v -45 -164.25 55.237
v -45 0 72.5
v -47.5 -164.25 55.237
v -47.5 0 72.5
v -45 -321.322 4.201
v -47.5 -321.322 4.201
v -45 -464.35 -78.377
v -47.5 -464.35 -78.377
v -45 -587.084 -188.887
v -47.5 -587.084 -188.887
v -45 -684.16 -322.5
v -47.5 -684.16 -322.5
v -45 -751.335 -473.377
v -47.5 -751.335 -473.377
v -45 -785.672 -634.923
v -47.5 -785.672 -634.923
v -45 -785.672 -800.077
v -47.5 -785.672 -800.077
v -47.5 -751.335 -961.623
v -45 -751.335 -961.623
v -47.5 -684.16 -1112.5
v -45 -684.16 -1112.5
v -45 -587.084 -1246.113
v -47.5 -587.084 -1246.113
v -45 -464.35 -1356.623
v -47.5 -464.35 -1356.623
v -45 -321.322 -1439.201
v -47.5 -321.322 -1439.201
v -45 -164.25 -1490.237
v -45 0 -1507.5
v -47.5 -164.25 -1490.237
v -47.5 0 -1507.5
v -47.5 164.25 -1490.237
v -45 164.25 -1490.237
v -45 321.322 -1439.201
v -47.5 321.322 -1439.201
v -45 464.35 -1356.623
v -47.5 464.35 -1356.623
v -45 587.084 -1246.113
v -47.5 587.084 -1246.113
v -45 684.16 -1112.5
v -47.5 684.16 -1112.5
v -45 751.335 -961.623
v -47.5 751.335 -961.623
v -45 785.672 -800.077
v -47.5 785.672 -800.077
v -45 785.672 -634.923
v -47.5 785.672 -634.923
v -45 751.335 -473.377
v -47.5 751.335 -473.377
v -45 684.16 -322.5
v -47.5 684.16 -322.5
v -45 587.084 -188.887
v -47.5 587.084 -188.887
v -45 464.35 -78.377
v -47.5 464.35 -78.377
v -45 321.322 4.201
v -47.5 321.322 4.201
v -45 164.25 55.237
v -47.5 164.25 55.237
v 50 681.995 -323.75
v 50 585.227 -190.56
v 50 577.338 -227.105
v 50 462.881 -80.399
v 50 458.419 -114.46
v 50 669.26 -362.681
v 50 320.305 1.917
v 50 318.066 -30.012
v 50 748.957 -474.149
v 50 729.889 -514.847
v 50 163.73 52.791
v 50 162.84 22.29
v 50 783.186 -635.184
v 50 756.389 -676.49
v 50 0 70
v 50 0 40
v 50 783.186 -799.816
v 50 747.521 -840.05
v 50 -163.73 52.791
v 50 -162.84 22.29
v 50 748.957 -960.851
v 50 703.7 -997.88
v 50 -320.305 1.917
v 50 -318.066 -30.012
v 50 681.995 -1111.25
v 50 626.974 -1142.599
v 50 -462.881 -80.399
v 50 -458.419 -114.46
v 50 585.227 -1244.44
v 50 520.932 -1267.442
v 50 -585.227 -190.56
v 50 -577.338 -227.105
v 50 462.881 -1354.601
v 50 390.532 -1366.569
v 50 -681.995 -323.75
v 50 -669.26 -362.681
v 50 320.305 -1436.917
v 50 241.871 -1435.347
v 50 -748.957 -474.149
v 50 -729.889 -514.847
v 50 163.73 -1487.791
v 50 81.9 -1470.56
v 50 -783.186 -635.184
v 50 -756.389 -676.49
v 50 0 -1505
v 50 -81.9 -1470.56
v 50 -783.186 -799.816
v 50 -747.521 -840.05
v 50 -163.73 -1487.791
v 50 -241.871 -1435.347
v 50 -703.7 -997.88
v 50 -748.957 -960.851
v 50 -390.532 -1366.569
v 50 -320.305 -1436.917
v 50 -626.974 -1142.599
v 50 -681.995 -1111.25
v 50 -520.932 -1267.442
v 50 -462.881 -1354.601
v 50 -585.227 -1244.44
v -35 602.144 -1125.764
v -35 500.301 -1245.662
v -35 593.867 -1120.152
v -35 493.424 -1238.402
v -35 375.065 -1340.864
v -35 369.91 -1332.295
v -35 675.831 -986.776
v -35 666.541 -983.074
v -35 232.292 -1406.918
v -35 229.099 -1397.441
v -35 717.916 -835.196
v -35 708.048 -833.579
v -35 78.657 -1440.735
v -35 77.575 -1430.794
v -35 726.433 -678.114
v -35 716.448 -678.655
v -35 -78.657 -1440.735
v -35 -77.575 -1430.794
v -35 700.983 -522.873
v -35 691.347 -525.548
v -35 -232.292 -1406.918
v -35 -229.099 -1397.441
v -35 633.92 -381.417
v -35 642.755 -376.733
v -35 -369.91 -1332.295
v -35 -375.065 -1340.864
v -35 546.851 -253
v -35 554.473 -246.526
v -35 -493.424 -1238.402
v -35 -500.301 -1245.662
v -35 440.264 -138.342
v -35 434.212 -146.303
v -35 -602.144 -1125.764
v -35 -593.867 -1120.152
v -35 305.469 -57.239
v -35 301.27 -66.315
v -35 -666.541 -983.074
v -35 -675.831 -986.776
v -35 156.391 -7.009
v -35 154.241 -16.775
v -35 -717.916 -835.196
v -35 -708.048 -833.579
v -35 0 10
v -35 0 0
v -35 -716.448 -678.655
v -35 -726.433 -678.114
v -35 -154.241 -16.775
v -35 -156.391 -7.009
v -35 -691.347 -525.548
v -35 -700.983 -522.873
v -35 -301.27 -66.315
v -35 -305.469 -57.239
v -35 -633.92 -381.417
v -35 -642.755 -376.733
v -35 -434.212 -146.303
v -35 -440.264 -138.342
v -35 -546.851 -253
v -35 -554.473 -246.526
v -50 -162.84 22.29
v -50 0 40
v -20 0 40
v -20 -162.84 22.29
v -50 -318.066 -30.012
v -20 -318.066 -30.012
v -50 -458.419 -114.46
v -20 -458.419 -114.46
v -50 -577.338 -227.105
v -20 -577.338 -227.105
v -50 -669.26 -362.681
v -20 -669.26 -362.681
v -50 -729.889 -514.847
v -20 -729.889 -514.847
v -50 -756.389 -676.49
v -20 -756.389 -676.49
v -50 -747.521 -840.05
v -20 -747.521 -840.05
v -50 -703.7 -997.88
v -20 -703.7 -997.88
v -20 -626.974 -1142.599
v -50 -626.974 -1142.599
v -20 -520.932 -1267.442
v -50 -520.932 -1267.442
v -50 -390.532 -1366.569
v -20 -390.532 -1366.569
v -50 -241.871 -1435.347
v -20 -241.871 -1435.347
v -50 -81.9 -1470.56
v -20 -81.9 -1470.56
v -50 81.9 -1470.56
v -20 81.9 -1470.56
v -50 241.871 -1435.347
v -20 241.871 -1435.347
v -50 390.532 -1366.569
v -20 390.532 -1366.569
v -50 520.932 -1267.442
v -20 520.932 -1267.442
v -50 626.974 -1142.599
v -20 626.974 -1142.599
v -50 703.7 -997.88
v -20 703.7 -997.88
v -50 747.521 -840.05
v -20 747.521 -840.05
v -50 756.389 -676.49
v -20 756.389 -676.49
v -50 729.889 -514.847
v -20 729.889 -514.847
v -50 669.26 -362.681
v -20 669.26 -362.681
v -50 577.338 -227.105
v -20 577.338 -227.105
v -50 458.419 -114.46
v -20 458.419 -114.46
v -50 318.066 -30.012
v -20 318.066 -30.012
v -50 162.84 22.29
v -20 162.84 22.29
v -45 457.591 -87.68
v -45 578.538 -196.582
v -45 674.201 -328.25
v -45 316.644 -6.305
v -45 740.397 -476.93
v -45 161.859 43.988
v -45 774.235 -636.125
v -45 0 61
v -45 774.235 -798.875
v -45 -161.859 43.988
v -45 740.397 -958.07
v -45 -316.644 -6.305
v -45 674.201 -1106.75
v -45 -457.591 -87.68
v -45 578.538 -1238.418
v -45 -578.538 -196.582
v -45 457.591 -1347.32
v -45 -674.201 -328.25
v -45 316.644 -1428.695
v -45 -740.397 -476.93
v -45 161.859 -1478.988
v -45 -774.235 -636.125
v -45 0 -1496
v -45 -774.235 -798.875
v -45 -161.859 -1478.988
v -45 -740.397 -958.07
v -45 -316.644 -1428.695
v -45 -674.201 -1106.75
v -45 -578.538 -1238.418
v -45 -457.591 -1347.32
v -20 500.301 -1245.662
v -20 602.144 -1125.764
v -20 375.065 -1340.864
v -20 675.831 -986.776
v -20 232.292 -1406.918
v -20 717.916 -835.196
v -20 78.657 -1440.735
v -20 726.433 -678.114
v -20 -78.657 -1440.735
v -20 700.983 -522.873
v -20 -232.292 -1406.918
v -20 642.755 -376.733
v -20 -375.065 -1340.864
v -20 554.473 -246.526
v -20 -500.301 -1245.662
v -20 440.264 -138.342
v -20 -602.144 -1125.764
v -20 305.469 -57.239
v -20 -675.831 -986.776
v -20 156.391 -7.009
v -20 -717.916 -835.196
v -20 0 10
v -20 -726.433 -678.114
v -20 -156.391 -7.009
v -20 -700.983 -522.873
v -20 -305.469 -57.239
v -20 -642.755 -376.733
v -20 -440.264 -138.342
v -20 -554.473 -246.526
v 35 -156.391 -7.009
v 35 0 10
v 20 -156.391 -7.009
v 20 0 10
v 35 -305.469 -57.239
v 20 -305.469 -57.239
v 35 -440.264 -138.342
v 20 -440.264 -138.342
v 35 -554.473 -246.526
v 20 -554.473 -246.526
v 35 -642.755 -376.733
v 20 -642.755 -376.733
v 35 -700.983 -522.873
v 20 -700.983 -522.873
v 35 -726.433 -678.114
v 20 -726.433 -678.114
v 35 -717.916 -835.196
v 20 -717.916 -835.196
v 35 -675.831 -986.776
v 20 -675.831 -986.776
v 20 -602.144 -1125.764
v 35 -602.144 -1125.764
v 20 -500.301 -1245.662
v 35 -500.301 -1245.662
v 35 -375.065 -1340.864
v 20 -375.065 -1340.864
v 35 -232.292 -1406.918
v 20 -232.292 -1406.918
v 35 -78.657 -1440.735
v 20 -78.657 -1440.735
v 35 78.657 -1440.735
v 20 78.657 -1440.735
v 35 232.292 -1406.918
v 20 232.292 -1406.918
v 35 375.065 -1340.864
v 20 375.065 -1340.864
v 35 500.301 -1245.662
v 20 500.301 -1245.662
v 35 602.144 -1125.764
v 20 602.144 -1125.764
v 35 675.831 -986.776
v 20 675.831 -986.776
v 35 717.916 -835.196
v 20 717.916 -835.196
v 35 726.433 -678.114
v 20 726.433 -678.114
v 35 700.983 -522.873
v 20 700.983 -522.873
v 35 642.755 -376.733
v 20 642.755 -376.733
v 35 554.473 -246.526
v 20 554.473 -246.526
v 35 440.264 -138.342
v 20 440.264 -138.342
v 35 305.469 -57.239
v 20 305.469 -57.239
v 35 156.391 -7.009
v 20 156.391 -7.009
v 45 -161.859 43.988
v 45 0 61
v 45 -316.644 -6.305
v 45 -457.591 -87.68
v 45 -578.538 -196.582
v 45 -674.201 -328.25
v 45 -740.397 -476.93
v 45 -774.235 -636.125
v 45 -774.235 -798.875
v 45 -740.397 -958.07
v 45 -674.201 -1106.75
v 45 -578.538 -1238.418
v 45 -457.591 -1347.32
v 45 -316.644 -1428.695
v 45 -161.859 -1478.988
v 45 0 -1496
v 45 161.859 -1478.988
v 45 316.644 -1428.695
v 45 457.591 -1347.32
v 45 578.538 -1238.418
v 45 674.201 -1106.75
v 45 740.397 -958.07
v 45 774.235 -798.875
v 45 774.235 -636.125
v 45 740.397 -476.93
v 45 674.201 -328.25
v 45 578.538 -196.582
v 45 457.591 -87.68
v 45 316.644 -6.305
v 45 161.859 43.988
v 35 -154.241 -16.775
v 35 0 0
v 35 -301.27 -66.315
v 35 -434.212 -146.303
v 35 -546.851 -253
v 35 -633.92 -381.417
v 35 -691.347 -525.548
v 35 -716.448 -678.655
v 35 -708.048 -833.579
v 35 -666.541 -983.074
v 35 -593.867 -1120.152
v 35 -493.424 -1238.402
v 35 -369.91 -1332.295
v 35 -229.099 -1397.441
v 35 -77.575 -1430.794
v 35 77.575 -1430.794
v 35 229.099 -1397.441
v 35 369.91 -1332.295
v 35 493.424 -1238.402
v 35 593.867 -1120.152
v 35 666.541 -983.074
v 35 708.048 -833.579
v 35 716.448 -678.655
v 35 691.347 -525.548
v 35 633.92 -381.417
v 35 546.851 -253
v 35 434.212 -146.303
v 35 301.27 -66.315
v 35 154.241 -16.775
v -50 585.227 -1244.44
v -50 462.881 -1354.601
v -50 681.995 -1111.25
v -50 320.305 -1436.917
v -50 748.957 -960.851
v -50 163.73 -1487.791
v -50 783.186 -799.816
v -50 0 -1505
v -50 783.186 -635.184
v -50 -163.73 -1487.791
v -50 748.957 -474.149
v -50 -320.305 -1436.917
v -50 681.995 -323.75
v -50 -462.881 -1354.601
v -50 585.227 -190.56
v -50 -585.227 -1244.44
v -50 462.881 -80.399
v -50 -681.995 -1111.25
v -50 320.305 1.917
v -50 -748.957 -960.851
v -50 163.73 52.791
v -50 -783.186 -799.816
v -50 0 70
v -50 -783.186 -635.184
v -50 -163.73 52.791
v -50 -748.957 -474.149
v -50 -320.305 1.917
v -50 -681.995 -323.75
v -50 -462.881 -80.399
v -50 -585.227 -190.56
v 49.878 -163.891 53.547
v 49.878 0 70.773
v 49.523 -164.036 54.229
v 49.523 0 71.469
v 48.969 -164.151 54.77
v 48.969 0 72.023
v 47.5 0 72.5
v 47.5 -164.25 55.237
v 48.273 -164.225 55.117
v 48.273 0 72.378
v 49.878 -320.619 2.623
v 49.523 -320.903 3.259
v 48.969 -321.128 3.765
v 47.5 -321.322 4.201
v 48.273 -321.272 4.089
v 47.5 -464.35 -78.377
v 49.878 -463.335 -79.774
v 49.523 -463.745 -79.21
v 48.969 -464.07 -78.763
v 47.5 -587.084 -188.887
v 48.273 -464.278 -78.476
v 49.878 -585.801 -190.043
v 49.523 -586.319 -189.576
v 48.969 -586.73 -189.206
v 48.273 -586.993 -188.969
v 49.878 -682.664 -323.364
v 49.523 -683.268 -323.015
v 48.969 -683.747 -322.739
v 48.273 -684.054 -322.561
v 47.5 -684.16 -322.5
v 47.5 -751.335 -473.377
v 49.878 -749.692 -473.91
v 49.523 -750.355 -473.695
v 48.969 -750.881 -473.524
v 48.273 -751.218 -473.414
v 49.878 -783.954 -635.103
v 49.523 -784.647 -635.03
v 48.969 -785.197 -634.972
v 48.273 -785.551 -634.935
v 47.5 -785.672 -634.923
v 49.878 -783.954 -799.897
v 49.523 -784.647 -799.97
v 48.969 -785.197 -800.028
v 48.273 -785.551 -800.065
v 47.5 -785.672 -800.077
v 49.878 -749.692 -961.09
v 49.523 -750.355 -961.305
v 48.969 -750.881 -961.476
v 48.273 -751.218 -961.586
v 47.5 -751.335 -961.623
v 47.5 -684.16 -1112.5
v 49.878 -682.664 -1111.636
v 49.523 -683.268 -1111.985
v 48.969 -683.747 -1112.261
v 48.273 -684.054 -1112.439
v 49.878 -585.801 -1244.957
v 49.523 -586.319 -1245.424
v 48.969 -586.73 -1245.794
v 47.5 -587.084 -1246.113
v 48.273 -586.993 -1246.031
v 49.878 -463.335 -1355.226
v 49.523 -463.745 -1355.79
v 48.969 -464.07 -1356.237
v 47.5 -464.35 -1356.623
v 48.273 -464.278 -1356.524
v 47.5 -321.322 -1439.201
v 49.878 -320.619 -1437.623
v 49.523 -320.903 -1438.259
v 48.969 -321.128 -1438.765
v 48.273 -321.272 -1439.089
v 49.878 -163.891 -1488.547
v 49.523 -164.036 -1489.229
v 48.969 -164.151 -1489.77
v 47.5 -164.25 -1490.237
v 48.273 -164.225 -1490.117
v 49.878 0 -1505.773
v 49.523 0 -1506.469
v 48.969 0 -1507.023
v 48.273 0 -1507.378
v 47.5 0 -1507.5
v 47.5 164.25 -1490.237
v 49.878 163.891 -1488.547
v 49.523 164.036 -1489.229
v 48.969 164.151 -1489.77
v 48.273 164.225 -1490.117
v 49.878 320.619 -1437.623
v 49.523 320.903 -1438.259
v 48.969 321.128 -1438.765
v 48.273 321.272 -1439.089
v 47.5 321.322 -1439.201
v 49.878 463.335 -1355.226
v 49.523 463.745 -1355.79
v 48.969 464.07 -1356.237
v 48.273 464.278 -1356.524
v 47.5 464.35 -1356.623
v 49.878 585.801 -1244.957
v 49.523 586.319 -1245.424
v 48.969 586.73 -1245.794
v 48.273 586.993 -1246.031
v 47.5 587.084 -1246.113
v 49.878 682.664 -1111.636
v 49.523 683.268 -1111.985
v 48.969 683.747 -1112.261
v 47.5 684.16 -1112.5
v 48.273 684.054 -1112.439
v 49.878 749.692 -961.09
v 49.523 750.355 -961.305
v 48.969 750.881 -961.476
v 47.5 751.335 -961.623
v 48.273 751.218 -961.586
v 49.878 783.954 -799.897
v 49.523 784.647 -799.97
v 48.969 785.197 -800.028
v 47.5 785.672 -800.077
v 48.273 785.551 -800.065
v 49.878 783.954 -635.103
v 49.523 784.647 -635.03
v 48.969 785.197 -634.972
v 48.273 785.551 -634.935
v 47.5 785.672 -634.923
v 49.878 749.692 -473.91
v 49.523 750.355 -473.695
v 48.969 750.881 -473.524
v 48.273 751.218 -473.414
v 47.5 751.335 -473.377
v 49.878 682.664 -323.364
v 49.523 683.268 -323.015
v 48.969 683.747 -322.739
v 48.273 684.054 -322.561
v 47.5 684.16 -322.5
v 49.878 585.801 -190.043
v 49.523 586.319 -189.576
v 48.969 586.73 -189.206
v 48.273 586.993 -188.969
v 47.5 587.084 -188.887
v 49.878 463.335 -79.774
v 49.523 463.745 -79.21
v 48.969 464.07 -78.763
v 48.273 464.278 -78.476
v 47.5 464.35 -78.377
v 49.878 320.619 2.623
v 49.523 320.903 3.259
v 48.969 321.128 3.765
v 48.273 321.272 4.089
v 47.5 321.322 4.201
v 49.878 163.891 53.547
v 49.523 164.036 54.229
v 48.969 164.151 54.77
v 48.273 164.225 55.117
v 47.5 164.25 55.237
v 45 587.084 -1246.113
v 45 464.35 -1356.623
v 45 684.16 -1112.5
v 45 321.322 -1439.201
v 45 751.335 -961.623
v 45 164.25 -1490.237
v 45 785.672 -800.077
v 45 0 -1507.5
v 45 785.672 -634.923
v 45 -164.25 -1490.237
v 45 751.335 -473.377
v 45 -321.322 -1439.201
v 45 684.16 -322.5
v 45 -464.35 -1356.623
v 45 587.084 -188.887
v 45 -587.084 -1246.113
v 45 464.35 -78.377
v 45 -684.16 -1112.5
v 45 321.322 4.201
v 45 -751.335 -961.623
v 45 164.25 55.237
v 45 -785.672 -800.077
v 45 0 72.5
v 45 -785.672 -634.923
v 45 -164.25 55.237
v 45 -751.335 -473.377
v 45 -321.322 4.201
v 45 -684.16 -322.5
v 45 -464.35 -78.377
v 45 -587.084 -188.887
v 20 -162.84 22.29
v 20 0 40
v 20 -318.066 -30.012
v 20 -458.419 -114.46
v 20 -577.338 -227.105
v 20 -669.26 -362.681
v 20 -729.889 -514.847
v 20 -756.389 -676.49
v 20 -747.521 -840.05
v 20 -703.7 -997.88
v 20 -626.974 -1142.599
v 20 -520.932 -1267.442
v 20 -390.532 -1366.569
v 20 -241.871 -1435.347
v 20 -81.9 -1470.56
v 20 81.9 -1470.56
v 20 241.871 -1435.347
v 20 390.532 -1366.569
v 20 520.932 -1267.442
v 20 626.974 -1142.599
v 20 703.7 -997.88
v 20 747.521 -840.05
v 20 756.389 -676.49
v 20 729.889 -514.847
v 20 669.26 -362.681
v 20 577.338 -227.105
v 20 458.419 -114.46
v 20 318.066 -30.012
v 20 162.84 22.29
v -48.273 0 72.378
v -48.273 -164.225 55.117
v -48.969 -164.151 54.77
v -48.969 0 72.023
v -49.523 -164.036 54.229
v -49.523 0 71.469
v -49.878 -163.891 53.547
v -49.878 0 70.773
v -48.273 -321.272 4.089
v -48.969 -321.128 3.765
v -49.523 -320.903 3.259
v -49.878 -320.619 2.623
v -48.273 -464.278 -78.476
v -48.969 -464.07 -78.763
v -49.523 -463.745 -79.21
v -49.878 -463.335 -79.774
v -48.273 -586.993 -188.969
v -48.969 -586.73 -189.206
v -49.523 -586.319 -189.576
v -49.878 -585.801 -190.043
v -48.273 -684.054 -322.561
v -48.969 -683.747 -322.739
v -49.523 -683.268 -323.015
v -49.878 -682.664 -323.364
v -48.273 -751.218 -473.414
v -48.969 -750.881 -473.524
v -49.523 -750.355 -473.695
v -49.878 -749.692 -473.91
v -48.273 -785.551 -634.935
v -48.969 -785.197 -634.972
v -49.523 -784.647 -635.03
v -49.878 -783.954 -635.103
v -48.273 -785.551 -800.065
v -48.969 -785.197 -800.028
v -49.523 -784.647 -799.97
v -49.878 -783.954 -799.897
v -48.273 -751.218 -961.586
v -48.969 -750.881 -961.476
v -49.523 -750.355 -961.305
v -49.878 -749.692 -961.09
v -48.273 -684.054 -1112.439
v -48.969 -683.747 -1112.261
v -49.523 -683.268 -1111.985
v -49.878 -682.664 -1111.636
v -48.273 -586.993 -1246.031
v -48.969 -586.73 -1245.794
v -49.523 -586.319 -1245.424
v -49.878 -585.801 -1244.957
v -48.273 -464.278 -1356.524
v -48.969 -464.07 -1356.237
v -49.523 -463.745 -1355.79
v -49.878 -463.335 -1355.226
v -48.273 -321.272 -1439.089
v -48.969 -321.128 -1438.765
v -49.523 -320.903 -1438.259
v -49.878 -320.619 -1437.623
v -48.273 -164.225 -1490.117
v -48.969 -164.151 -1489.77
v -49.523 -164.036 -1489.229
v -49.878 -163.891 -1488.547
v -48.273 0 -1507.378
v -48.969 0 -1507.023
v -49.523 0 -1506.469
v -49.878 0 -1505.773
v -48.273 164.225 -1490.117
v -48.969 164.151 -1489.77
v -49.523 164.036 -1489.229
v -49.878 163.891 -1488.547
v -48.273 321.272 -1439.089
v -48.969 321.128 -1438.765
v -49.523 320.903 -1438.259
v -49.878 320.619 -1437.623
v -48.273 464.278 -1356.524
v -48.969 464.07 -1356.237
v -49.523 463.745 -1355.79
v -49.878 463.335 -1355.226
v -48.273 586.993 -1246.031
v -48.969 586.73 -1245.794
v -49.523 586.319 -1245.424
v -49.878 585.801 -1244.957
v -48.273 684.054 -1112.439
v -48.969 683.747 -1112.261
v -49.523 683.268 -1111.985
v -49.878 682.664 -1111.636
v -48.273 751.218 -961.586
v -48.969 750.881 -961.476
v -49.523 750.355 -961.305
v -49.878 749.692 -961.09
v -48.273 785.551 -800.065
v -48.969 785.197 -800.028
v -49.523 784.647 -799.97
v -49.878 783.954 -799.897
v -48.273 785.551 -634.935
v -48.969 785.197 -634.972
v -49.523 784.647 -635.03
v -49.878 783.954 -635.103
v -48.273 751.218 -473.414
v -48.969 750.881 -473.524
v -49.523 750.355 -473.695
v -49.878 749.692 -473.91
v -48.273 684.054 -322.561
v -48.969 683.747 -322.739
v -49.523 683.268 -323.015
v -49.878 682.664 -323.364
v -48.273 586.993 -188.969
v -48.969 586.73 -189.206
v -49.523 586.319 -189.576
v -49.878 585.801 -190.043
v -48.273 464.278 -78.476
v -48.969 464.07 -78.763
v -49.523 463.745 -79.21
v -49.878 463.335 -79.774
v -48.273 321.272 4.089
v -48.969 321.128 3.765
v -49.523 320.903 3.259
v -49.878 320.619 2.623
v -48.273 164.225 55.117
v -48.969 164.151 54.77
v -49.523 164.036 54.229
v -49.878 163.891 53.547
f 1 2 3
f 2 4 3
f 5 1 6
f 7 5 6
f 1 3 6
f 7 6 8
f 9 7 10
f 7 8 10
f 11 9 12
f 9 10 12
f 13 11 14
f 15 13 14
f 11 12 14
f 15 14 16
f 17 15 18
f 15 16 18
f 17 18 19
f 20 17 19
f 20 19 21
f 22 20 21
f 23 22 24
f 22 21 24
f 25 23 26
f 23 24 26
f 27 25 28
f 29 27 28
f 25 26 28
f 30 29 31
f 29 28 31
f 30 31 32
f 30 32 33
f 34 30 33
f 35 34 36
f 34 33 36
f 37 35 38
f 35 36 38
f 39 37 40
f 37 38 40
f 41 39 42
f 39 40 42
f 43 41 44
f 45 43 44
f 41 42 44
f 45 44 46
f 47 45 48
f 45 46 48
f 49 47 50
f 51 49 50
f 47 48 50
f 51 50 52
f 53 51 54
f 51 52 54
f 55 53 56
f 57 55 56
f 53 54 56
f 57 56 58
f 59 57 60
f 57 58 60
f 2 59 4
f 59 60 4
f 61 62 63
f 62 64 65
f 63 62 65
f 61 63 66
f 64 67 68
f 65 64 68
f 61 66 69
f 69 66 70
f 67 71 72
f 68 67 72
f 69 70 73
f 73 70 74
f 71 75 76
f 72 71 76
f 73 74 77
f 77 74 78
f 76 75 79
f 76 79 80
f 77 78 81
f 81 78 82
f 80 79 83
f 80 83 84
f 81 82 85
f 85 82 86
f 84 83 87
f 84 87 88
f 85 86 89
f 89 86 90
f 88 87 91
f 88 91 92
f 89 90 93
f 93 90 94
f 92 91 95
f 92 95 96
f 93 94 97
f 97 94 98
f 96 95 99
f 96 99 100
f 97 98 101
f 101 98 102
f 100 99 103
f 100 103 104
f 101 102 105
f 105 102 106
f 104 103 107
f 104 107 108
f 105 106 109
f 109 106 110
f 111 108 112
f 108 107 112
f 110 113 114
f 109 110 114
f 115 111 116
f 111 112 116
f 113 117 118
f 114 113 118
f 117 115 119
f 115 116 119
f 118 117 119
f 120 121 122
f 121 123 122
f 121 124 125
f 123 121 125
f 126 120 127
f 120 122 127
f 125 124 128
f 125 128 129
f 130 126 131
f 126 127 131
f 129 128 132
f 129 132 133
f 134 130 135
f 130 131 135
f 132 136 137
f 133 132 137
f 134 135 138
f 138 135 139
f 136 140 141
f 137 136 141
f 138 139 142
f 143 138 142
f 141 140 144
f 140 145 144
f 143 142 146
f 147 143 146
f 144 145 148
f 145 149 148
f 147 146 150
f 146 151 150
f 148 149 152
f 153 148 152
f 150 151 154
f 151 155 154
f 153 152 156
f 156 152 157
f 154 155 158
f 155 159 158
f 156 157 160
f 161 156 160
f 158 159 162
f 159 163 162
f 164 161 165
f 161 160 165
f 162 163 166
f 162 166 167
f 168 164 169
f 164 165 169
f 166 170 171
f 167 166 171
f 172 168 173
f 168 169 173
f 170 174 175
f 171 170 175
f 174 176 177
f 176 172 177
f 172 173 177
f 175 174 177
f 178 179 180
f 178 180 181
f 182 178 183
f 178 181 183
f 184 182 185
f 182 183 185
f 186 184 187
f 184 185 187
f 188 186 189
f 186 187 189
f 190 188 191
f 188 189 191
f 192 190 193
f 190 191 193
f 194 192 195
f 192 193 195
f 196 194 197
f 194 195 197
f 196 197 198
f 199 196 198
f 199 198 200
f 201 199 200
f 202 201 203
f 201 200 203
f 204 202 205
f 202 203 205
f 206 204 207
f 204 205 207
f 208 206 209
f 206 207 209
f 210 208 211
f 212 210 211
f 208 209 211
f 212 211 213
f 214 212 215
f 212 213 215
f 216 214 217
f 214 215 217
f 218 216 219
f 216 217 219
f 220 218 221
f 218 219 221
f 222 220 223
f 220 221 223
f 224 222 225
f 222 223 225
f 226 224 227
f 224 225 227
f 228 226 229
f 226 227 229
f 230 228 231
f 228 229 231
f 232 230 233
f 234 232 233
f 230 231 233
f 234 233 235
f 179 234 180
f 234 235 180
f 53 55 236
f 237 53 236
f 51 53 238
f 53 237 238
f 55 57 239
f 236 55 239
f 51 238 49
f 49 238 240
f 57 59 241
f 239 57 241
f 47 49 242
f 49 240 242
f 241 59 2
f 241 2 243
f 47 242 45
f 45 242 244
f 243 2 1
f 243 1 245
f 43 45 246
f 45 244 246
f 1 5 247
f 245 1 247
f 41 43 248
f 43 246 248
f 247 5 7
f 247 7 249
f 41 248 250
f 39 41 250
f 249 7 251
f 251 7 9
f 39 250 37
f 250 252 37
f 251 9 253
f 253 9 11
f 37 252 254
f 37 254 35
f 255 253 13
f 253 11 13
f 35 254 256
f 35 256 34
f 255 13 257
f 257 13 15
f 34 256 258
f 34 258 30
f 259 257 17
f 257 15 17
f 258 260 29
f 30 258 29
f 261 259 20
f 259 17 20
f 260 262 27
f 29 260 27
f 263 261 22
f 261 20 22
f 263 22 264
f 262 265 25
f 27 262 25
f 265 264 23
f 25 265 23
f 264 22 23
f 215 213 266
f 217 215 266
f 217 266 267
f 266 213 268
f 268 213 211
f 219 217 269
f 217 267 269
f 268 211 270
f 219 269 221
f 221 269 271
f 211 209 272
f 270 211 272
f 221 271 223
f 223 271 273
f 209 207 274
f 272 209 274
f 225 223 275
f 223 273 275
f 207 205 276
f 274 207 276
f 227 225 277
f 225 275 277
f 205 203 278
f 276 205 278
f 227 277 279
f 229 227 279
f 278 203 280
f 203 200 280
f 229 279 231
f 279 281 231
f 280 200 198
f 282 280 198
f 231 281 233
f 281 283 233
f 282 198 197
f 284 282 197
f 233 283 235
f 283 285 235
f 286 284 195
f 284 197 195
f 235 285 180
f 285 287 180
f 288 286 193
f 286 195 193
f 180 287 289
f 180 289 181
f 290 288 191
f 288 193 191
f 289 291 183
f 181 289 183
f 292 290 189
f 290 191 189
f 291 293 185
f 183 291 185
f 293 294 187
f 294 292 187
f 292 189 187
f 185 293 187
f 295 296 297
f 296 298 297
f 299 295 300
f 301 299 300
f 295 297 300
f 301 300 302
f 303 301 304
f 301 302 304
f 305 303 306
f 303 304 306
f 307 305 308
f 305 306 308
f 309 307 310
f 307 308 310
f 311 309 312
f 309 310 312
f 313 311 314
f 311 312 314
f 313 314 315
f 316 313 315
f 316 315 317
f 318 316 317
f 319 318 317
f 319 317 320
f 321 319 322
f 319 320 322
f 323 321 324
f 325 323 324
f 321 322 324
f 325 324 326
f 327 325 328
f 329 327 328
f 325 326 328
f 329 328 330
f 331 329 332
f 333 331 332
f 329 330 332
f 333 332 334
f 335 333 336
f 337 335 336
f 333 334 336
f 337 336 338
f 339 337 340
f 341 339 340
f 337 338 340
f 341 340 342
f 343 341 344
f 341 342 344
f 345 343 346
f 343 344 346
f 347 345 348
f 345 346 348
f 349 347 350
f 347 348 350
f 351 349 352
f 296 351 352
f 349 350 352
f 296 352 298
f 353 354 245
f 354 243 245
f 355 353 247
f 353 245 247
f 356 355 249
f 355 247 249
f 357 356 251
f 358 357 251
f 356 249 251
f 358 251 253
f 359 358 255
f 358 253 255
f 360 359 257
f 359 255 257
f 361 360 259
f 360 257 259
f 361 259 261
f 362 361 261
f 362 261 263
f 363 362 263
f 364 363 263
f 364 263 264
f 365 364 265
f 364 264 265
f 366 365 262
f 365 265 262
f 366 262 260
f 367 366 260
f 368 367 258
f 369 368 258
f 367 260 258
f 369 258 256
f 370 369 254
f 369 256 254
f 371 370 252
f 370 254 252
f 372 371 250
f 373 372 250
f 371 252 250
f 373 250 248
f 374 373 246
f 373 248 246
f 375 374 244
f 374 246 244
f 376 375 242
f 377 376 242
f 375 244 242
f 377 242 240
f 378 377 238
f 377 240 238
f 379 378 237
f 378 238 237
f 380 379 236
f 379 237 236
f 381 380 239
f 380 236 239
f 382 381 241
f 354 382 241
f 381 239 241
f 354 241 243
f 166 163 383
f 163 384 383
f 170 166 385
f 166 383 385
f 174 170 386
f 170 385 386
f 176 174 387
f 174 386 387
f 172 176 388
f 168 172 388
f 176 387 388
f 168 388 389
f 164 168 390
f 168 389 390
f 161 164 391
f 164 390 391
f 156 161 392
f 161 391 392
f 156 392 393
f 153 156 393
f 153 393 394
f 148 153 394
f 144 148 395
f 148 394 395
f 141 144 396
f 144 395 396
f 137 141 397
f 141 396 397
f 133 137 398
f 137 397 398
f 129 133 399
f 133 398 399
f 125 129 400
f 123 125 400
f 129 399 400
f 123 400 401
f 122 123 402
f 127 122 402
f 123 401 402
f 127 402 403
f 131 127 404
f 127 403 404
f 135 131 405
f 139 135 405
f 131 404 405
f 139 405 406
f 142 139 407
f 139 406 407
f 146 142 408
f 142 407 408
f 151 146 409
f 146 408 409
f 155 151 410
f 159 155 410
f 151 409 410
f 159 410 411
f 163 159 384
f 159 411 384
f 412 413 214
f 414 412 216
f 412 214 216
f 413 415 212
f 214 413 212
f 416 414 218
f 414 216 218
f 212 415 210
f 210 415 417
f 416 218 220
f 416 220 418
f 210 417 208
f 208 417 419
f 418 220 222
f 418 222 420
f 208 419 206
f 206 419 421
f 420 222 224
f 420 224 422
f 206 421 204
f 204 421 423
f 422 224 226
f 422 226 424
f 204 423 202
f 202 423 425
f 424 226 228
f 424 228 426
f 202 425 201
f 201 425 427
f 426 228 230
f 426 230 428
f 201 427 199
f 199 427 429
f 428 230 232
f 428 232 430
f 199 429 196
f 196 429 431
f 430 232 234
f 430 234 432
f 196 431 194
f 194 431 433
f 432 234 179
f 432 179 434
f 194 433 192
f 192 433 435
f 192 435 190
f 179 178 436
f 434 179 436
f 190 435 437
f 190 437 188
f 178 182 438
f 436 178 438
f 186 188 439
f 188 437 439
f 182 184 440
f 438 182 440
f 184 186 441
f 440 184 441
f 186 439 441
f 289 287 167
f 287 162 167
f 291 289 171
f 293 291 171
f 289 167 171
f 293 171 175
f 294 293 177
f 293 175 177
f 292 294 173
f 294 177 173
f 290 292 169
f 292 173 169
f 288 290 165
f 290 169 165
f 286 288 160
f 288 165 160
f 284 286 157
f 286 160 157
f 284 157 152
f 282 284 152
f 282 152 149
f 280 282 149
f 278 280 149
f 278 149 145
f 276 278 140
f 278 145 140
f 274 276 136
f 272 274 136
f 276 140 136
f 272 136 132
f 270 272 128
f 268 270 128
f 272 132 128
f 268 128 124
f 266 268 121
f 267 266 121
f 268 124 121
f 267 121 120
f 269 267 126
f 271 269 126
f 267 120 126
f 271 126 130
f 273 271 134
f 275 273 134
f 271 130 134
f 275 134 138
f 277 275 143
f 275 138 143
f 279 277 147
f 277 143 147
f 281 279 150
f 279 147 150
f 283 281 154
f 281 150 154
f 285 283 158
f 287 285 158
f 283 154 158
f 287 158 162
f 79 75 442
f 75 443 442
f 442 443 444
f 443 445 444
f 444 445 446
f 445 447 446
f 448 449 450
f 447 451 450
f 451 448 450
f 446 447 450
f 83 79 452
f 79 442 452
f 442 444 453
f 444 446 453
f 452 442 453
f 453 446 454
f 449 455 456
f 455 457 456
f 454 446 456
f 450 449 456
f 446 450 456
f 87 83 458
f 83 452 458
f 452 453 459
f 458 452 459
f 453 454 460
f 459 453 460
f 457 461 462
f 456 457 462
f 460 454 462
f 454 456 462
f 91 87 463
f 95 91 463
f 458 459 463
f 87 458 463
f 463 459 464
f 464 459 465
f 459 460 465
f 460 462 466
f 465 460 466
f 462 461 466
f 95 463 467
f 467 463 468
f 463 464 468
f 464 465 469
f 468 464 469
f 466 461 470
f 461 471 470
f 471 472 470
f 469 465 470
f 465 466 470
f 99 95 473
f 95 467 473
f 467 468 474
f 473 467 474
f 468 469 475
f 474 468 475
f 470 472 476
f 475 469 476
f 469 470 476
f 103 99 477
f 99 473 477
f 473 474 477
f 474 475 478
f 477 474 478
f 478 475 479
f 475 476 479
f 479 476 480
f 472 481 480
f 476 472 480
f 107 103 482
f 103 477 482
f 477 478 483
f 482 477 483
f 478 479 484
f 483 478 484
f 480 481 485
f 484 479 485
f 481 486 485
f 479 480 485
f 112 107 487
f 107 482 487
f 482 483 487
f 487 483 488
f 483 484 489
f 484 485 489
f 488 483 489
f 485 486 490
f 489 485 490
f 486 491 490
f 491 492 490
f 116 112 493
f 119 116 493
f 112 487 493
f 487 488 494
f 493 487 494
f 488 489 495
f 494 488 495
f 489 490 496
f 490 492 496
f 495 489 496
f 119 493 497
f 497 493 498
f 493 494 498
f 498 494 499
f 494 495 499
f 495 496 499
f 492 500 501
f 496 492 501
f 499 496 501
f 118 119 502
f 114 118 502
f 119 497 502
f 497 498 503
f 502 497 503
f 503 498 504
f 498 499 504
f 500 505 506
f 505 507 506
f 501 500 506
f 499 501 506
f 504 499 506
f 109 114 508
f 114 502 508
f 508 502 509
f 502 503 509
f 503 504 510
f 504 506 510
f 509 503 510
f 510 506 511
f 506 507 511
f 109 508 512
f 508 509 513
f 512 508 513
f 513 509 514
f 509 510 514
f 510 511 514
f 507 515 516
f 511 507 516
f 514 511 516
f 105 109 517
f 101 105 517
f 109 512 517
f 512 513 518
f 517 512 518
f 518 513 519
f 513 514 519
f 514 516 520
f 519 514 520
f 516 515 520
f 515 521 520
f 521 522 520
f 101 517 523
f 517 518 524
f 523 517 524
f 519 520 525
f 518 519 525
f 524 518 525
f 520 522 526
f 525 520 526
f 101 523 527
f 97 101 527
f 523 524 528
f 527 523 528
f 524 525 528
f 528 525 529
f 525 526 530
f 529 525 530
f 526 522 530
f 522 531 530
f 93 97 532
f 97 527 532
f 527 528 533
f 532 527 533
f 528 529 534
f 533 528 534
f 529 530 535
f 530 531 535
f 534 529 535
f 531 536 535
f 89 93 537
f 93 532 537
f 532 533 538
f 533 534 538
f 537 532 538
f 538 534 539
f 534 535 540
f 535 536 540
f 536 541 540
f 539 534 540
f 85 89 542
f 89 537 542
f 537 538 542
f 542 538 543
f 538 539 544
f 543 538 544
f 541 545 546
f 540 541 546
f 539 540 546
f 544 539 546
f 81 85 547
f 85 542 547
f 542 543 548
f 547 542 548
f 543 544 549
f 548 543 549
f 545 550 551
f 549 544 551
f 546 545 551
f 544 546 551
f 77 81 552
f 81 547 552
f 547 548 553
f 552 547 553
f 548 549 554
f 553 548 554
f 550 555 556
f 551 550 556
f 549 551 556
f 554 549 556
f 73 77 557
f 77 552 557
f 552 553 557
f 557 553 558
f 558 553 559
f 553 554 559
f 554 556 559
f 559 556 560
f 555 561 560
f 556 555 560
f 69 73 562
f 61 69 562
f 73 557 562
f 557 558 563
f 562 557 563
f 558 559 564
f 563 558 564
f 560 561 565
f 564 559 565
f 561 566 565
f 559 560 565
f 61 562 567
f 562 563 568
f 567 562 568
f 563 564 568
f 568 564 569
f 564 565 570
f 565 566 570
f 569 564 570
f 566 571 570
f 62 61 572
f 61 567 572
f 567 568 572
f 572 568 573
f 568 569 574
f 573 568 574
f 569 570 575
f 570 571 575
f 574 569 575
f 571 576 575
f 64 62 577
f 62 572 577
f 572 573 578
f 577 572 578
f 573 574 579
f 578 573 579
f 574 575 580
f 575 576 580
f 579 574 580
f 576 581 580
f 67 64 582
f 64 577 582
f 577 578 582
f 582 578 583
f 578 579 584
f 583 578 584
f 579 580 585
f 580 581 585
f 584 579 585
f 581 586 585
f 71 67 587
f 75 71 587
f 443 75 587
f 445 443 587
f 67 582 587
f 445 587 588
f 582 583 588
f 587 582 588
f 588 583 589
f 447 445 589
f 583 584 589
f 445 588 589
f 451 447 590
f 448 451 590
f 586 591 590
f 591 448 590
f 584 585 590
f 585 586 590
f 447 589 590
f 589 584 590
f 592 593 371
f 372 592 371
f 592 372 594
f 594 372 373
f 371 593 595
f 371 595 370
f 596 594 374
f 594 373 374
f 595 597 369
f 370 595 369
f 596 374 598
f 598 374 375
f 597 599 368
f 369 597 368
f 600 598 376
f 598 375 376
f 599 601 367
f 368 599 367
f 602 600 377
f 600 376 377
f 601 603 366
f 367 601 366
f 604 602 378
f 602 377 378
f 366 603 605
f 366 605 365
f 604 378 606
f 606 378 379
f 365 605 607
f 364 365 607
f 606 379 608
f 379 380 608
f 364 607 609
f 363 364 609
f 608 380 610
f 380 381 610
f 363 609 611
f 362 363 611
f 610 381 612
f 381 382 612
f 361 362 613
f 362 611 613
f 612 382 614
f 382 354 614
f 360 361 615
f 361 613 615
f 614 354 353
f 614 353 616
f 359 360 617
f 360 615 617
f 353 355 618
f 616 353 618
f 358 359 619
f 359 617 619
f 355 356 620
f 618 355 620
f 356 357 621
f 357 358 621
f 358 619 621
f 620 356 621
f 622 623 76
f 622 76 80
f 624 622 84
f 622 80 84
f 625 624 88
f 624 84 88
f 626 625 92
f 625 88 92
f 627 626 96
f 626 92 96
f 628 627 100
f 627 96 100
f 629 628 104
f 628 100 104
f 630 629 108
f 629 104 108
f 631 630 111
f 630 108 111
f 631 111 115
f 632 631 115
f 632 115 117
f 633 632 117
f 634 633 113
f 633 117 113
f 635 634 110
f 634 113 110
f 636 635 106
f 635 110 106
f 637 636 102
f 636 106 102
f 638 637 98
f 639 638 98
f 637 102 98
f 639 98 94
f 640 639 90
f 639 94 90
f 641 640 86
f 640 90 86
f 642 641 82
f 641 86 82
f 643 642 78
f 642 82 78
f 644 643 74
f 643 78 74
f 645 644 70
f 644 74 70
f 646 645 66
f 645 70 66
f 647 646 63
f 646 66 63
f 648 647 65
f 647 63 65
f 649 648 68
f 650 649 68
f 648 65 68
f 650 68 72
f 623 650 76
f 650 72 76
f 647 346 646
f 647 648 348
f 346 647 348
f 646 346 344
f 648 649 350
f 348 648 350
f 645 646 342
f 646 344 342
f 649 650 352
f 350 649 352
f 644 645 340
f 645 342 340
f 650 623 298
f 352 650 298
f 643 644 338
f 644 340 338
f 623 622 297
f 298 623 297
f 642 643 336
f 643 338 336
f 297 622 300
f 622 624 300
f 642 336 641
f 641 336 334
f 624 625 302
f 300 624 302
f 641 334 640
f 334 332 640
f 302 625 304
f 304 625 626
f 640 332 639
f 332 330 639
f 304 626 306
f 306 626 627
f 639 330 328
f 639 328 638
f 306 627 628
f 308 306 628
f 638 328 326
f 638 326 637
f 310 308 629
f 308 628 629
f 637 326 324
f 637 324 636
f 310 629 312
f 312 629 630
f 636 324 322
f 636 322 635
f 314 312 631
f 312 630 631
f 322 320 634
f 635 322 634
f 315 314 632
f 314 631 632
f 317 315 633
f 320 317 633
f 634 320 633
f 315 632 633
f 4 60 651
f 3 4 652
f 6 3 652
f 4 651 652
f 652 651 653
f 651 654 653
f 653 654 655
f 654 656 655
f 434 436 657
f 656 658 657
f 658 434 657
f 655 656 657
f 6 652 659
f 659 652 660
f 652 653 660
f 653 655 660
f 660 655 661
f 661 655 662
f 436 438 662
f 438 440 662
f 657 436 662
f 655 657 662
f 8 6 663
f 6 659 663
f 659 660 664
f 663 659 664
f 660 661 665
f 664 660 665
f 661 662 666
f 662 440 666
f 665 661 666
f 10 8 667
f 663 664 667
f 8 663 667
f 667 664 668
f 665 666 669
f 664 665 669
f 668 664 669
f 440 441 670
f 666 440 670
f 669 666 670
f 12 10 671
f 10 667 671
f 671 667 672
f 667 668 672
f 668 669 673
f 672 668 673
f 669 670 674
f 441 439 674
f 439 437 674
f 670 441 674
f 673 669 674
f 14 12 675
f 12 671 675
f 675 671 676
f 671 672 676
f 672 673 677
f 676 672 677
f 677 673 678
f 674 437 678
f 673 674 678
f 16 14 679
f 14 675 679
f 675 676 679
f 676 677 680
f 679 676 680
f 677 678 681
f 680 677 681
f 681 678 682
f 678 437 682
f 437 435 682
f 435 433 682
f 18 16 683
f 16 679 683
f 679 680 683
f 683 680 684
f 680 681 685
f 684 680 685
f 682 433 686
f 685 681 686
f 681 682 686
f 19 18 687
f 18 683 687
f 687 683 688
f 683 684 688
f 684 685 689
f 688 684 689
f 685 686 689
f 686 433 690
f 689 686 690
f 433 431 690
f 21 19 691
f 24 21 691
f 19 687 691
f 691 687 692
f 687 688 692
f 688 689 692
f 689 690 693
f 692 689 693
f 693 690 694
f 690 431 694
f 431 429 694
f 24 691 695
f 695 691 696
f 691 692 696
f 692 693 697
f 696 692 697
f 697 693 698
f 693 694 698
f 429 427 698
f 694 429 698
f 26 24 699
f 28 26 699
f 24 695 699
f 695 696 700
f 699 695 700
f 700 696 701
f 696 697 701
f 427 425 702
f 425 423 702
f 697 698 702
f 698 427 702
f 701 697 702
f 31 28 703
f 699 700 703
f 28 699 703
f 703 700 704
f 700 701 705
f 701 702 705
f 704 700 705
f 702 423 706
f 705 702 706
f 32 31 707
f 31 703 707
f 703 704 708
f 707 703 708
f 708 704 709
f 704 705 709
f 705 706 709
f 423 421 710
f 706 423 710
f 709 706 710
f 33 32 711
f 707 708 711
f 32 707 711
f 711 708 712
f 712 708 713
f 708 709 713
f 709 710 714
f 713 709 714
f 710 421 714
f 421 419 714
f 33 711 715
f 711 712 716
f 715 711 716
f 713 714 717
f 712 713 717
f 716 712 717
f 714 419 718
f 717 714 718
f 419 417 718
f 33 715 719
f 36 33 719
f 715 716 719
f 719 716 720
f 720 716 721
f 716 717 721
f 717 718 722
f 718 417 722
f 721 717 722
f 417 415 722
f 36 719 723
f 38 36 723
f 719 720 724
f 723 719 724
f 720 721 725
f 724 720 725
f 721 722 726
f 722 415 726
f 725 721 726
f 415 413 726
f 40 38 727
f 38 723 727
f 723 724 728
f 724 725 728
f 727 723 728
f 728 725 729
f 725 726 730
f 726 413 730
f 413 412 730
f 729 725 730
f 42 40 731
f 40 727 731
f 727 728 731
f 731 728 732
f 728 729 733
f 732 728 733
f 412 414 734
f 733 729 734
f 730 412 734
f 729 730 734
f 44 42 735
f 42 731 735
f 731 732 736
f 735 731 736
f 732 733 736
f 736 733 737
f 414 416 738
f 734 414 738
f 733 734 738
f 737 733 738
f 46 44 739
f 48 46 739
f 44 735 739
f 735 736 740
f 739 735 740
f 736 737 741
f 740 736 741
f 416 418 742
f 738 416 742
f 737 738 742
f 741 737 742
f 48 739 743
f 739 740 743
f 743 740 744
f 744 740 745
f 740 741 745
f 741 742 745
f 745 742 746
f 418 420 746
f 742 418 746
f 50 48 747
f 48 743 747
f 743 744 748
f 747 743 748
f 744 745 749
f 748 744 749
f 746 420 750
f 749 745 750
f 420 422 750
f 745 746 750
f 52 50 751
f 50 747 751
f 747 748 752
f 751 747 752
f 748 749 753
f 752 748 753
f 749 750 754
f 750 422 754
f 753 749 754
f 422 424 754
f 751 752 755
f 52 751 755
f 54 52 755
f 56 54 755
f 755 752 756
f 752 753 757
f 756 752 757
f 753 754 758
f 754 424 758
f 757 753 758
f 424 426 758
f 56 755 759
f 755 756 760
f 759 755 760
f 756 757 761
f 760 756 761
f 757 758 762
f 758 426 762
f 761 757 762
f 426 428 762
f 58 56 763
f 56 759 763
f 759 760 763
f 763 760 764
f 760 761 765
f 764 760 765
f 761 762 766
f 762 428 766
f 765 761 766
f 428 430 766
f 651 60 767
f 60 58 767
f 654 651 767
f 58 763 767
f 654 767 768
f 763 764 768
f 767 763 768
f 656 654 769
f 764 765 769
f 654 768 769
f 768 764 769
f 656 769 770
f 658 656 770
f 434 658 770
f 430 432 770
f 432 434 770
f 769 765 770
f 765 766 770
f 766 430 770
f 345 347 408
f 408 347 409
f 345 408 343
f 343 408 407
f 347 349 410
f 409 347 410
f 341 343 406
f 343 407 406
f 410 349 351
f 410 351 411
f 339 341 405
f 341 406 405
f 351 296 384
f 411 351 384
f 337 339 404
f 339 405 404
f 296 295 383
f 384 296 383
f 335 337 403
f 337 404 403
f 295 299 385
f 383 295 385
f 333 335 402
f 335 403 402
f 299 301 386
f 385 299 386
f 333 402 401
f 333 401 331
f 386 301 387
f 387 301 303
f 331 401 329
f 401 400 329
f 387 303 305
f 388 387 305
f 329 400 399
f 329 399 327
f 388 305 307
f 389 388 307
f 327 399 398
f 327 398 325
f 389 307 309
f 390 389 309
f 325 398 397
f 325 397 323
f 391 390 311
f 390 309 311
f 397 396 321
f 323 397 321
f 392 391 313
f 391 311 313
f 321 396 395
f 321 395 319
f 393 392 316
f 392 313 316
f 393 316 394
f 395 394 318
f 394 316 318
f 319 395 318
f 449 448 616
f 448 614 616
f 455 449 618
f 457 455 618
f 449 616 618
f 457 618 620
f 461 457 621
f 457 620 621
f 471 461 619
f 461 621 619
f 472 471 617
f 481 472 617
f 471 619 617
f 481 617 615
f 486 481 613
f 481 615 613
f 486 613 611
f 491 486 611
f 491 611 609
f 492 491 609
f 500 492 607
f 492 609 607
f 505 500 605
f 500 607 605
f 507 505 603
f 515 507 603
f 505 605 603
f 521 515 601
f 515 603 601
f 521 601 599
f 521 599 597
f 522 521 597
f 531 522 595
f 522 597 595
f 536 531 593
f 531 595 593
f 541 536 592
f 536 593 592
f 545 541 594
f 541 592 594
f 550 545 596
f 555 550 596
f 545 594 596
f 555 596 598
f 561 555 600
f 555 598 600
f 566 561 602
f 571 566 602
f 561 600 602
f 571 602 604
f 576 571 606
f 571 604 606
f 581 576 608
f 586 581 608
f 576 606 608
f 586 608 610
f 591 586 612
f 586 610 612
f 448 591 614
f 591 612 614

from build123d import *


with BuildPart() as f1:
    # F0 (on Front) → F1 (revolve)
    with BuildSketch(Plane.XZ):
        with BuildLine():
            Line((0, 61), (0, 0))
            Line((0, 0), (35, 0))
            Line((35, 0), (35, 10))
            Line((35, 10), (20, 10))
            Line((20, 10), (20, 40))
            Line((20, 40), (50, 40))
            Line((50, 40), (50, 70))
            ThreePointArc((50, 70), (49.267767, 71.767767), (47.5, 72.5))
            Line((47.5, 72.5), (45, 72.5))
            Line((45, 72.5), (45, 61))
            Line((45, 61), (0, 61))
        make_face()
        with BuildLine():
            Line((-35, 0), (0, 0))
            Line((0, 0), (0, 61))
            Line((0, 61), (-45, 61))
            Line((-45, 61), (-45, 72.5))
            Line((-45, 72.5), (-47.5, 72.5))
            ThreePointArc((-47.5, 72.5), (-49.267767, 71.767767), (-50, 70))
            Line((-50, 70), (-50, 40))
            Line((-50, 40), (-20, 40))
            Line((-20, 40), (-20, 10))
            Line((-20, 10), (-35, 10))
            Line((-35, 10), (-35, 0))
        make_face()
    revolve(axis=Axis((25.468834, 0, -717.5), (1, 0, 0)))


solid = f1.part
